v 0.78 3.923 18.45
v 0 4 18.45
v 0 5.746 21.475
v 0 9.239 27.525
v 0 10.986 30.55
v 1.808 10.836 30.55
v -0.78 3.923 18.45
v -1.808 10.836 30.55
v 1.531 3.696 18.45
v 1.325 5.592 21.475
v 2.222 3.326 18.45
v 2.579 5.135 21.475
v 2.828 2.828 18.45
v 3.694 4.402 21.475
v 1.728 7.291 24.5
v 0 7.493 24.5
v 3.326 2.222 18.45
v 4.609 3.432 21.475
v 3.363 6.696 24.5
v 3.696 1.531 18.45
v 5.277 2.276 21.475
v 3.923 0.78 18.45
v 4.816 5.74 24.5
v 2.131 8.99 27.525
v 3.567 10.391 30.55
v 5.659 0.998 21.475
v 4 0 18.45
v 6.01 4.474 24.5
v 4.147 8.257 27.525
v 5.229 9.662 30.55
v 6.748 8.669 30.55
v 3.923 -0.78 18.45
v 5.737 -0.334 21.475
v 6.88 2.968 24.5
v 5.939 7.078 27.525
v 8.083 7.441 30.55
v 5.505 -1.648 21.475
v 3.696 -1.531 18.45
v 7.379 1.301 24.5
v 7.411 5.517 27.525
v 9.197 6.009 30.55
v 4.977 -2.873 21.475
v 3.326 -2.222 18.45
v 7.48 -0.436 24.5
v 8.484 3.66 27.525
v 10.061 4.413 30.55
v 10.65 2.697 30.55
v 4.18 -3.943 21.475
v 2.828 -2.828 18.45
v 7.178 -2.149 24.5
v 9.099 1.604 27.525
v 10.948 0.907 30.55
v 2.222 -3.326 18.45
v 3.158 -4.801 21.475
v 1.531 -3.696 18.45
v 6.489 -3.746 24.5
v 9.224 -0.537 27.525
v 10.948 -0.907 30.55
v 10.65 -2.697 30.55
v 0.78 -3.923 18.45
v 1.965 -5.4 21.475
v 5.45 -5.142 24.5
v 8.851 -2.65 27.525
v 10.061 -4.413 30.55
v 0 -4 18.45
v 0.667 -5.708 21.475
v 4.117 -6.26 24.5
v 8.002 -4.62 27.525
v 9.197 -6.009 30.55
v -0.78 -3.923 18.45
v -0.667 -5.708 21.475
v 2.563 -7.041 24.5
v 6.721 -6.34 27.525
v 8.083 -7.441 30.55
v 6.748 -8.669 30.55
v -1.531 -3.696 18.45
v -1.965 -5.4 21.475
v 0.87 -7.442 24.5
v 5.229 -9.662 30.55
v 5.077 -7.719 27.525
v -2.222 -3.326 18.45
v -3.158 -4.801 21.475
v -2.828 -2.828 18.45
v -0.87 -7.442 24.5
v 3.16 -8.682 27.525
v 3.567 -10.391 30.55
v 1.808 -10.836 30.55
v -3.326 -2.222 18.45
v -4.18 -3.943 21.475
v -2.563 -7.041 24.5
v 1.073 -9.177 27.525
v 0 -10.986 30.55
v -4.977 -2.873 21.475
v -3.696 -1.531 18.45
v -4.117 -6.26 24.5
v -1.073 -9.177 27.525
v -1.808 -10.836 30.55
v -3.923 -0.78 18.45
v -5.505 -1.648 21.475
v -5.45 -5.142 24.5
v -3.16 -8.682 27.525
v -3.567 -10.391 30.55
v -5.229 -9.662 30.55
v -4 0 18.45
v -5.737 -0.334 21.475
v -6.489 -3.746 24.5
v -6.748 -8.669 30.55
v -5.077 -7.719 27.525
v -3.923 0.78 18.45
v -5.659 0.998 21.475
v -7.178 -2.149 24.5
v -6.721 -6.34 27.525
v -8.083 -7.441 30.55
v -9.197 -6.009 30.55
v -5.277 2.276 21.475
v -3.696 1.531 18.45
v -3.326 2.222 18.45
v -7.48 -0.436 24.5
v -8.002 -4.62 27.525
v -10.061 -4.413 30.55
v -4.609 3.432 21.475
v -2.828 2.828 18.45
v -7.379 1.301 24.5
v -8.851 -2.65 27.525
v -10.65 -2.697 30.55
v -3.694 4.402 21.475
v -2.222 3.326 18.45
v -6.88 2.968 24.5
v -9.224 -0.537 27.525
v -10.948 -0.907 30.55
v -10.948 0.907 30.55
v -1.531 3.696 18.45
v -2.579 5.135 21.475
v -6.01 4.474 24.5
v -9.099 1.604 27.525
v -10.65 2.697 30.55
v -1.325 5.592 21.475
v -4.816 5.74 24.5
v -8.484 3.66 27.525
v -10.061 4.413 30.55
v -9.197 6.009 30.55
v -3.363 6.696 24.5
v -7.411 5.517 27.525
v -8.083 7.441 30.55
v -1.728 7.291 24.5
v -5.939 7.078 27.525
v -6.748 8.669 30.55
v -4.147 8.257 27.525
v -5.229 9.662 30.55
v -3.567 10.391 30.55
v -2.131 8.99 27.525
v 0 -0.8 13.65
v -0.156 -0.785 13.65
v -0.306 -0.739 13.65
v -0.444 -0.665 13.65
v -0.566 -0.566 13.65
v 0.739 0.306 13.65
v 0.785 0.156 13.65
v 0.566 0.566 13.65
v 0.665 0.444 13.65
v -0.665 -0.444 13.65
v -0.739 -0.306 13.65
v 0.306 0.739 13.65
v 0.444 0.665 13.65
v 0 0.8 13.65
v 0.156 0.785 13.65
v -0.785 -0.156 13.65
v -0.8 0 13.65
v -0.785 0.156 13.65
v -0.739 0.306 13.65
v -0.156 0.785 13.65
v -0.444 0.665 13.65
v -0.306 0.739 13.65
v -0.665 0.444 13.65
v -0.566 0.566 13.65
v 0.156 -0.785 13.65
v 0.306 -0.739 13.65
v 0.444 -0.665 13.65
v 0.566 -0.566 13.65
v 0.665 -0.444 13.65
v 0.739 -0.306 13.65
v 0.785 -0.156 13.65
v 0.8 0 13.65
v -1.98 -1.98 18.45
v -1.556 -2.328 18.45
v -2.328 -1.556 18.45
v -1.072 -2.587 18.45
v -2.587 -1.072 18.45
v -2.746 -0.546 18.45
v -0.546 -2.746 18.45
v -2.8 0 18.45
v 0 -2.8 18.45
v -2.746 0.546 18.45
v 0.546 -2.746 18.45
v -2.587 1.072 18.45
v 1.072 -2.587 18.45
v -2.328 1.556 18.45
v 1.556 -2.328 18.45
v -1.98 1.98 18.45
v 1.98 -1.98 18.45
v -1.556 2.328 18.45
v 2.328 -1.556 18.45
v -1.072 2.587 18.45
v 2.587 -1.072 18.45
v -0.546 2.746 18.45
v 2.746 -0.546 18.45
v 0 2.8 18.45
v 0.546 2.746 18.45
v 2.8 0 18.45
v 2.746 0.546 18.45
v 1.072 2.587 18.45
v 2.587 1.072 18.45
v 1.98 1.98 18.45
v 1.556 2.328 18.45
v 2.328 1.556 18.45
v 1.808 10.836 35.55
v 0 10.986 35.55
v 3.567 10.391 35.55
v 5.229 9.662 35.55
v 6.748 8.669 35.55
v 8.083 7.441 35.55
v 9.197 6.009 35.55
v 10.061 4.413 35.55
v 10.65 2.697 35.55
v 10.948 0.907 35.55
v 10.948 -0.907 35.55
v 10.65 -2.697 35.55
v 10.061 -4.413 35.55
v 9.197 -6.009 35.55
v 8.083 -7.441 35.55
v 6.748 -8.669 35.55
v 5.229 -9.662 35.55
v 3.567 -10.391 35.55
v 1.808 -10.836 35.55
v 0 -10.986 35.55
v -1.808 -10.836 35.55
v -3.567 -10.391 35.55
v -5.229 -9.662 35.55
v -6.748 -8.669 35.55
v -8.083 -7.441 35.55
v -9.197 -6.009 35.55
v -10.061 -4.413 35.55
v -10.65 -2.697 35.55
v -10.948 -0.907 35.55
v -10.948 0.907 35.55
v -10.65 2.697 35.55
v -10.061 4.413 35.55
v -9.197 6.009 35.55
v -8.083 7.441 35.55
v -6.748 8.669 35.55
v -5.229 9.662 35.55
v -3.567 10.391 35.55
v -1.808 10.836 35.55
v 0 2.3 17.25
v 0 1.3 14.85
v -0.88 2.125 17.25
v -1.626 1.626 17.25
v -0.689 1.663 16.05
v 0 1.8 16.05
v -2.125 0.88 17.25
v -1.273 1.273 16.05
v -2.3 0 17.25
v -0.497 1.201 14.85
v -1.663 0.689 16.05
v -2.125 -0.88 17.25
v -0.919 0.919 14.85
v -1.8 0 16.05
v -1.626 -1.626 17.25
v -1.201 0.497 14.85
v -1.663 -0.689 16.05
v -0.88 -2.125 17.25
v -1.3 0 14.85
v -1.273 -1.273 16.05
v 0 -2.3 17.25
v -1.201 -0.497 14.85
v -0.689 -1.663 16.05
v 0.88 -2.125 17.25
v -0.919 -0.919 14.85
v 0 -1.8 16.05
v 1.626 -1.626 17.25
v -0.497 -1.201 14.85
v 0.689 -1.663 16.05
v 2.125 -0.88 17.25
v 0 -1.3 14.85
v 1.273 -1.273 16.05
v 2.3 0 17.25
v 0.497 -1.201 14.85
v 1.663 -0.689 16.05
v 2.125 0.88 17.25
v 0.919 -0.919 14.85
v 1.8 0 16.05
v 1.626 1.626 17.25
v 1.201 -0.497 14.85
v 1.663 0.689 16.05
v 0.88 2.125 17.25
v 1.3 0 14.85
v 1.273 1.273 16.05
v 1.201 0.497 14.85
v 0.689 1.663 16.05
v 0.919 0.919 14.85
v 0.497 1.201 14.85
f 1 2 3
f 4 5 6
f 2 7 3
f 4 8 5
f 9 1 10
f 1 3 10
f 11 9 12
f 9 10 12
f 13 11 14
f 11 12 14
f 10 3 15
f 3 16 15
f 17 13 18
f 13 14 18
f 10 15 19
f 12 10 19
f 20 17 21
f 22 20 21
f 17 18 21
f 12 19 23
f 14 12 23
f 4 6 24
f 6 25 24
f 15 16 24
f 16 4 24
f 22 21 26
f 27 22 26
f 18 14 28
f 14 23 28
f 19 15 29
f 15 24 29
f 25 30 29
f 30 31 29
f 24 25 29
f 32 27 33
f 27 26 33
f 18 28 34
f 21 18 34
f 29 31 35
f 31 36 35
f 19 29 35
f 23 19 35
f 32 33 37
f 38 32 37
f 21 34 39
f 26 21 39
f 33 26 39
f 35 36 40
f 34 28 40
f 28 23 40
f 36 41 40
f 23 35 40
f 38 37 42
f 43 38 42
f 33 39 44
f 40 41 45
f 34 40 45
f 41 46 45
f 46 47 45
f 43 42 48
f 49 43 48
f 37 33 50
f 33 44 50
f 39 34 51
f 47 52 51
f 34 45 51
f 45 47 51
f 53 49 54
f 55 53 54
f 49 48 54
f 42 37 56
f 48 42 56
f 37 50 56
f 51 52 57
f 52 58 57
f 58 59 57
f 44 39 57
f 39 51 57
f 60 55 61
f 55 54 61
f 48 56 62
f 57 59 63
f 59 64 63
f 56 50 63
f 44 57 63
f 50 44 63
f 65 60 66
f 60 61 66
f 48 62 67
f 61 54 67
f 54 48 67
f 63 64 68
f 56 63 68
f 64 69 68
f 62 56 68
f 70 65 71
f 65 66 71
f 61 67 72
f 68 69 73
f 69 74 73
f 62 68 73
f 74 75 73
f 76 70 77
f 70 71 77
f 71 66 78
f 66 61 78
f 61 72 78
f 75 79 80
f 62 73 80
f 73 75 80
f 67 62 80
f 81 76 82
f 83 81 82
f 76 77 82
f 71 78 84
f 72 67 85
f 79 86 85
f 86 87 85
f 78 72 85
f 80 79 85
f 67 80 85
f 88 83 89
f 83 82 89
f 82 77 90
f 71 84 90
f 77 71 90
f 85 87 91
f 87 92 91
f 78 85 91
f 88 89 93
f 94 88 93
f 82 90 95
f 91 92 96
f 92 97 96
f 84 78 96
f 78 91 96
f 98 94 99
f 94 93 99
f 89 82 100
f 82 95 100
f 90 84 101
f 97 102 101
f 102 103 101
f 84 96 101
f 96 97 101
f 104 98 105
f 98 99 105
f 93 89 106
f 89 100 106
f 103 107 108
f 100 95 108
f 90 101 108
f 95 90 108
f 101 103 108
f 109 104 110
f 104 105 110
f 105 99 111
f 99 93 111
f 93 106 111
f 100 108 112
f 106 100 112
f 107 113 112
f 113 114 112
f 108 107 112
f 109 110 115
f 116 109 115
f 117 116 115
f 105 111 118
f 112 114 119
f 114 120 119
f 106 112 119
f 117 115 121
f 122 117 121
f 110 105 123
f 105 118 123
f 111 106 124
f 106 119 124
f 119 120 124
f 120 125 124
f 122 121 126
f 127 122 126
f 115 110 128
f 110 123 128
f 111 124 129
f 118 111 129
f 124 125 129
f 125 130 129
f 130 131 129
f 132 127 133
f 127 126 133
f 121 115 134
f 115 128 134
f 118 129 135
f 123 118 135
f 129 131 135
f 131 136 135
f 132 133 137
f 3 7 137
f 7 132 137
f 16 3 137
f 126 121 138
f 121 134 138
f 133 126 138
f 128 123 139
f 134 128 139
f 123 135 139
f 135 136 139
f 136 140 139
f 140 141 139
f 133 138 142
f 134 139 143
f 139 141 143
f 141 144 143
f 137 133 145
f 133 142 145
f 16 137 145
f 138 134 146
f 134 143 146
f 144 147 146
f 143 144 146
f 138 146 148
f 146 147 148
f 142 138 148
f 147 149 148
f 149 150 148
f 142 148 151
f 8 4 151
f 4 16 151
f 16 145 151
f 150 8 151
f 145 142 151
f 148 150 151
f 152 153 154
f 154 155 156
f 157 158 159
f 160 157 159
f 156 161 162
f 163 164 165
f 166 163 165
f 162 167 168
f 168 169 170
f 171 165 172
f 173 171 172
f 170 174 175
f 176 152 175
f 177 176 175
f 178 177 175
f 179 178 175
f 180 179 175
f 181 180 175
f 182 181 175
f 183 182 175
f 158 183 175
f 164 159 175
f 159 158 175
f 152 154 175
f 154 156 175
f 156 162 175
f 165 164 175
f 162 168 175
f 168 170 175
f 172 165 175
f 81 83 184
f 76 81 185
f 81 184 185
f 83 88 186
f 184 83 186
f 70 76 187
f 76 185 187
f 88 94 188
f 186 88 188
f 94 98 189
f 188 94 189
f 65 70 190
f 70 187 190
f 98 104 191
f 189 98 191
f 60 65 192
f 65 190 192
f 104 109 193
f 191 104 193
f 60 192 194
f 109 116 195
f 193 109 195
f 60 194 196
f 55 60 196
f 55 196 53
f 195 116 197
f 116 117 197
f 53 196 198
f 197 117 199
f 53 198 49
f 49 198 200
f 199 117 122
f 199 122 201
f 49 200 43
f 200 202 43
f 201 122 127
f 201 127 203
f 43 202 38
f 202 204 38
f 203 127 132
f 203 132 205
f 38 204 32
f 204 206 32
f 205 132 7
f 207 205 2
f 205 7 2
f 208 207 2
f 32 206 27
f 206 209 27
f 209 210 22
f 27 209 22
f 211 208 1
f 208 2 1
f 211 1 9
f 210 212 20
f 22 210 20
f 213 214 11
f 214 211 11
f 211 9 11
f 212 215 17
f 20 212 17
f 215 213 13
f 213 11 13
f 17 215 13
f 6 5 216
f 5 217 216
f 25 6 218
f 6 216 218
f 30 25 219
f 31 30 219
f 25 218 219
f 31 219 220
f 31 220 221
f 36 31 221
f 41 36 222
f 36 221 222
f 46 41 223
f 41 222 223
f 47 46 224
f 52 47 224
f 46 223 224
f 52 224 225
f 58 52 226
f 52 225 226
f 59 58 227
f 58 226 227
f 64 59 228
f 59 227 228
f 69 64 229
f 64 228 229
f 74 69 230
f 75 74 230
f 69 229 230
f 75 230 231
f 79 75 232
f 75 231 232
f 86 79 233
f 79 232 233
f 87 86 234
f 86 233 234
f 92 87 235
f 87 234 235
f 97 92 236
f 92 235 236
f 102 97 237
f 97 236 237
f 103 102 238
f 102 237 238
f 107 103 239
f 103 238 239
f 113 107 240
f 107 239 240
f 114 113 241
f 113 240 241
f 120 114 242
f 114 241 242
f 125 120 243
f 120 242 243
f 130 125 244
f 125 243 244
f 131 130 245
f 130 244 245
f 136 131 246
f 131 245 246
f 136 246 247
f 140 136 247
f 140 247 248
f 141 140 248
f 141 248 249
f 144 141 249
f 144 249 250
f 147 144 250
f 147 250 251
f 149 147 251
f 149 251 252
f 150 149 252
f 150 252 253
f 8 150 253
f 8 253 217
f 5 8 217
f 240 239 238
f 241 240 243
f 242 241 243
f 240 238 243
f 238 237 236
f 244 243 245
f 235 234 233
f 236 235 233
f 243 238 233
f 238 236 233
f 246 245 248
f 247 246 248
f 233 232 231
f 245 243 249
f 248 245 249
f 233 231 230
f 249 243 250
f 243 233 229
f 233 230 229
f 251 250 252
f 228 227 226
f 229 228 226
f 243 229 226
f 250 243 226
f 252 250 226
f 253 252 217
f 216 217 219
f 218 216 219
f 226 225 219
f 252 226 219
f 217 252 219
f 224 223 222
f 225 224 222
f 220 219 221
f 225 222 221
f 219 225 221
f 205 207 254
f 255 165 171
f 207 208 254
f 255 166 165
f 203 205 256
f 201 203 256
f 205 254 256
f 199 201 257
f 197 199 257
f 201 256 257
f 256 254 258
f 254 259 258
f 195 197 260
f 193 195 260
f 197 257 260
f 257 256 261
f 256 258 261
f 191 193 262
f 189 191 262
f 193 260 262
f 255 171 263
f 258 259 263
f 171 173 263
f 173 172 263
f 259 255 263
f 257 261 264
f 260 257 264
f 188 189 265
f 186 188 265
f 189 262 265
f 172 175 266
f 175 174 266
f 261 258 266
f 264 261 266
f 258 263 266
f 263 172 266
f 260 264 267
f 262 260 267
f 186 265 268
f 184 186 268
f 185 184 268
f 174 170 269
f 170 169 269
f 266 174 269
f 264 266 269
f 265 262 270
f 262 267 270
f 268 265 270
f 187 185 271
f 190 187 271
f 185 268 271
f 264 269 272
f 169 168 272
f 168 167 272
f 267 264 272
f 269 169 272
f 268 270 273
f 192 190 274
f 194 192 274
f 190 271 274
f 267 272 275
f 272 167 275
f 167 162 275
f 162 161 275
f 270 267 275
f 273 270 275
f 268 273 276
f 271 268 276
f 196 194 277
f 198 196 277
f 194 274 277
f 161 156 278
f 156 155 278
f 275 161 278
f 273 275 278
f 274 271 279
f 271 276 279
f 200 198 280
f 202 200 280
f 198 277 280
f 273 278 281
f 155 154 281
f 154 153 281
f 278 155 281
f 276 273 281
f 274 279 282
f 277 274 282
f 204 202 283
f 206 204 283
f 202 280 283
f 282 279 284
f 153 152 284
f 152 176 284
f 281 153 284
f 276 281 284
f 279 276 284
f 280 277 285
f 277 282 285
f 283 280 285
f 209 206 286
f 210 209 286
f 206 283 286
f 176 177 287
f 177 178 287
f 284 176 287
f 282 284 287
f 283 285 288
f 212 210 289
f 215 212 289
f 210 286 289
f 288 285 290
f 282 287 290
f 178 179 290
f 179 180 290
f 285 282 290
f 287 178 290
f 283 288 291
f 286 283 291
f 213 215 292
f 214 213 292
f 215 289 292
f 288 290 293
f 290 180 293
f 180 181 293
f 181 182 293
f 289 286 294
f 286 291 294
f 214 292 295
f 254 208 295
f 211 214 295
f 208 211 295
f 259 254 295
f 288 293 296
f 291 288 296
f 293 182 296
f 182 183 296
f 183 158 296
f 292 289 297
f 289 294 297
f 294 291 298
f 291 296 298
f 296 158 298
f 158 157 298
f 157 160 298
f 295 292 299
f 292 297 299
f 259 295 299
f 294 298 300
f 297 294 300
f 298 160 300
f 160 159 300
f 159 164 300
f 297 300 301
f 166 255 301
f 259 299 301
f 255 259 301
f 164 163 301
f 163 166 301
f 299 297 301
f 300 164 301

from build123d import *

# Parameters (mm, degrees)
ESQUISSE2_R             = 15.4
ENL_V_MAT_EXTRU_1_DEPTH = 54


with BuildPart() as part:
    # Esquisse1 → Révolution1 (revolve)
    with BuildSketch(Plane(origin=(0, 0, 0), x_dir=(0, 0, -1), z_dir=(1, 0, 0))):
        Polygon((-30.55, 10.985938257), (-35.55, 10.985938257), (-35.55, 0), (35.55, 0), (35.55, 15.4), (30.55, 15.4), (-18.45, 4), align=None)
    revolve(axis=Axis((0, 0, 35.55), (0, 0, -1)))

    # Esquisse2 → Enlèv. mat.-Extru.1 (cut)
    with BuildSketch(Plane.XY.offset(18.45)):
        Circle(ESQUISSE2_R)
    extrude(amount=-ENL_V_MAT_EXTRU_1_DEPTH, mode=Mode.SUBTRACT)

    # Esquisse6 → Révolution2 (revolve)
    with BuildSketch(Plane(origin=(0, 0, 0), x_dir=(0, 0, -1), z_dir=(1, 0, 0))):
        Polygon((-18.45, 2.8), (-13.65, 0.8), (-13.65, 0), (-18.45, 0), align=None)
    revolve(axis=Axis((0, 0, 13.65), (0, 0, 1)))


solid = part.part
